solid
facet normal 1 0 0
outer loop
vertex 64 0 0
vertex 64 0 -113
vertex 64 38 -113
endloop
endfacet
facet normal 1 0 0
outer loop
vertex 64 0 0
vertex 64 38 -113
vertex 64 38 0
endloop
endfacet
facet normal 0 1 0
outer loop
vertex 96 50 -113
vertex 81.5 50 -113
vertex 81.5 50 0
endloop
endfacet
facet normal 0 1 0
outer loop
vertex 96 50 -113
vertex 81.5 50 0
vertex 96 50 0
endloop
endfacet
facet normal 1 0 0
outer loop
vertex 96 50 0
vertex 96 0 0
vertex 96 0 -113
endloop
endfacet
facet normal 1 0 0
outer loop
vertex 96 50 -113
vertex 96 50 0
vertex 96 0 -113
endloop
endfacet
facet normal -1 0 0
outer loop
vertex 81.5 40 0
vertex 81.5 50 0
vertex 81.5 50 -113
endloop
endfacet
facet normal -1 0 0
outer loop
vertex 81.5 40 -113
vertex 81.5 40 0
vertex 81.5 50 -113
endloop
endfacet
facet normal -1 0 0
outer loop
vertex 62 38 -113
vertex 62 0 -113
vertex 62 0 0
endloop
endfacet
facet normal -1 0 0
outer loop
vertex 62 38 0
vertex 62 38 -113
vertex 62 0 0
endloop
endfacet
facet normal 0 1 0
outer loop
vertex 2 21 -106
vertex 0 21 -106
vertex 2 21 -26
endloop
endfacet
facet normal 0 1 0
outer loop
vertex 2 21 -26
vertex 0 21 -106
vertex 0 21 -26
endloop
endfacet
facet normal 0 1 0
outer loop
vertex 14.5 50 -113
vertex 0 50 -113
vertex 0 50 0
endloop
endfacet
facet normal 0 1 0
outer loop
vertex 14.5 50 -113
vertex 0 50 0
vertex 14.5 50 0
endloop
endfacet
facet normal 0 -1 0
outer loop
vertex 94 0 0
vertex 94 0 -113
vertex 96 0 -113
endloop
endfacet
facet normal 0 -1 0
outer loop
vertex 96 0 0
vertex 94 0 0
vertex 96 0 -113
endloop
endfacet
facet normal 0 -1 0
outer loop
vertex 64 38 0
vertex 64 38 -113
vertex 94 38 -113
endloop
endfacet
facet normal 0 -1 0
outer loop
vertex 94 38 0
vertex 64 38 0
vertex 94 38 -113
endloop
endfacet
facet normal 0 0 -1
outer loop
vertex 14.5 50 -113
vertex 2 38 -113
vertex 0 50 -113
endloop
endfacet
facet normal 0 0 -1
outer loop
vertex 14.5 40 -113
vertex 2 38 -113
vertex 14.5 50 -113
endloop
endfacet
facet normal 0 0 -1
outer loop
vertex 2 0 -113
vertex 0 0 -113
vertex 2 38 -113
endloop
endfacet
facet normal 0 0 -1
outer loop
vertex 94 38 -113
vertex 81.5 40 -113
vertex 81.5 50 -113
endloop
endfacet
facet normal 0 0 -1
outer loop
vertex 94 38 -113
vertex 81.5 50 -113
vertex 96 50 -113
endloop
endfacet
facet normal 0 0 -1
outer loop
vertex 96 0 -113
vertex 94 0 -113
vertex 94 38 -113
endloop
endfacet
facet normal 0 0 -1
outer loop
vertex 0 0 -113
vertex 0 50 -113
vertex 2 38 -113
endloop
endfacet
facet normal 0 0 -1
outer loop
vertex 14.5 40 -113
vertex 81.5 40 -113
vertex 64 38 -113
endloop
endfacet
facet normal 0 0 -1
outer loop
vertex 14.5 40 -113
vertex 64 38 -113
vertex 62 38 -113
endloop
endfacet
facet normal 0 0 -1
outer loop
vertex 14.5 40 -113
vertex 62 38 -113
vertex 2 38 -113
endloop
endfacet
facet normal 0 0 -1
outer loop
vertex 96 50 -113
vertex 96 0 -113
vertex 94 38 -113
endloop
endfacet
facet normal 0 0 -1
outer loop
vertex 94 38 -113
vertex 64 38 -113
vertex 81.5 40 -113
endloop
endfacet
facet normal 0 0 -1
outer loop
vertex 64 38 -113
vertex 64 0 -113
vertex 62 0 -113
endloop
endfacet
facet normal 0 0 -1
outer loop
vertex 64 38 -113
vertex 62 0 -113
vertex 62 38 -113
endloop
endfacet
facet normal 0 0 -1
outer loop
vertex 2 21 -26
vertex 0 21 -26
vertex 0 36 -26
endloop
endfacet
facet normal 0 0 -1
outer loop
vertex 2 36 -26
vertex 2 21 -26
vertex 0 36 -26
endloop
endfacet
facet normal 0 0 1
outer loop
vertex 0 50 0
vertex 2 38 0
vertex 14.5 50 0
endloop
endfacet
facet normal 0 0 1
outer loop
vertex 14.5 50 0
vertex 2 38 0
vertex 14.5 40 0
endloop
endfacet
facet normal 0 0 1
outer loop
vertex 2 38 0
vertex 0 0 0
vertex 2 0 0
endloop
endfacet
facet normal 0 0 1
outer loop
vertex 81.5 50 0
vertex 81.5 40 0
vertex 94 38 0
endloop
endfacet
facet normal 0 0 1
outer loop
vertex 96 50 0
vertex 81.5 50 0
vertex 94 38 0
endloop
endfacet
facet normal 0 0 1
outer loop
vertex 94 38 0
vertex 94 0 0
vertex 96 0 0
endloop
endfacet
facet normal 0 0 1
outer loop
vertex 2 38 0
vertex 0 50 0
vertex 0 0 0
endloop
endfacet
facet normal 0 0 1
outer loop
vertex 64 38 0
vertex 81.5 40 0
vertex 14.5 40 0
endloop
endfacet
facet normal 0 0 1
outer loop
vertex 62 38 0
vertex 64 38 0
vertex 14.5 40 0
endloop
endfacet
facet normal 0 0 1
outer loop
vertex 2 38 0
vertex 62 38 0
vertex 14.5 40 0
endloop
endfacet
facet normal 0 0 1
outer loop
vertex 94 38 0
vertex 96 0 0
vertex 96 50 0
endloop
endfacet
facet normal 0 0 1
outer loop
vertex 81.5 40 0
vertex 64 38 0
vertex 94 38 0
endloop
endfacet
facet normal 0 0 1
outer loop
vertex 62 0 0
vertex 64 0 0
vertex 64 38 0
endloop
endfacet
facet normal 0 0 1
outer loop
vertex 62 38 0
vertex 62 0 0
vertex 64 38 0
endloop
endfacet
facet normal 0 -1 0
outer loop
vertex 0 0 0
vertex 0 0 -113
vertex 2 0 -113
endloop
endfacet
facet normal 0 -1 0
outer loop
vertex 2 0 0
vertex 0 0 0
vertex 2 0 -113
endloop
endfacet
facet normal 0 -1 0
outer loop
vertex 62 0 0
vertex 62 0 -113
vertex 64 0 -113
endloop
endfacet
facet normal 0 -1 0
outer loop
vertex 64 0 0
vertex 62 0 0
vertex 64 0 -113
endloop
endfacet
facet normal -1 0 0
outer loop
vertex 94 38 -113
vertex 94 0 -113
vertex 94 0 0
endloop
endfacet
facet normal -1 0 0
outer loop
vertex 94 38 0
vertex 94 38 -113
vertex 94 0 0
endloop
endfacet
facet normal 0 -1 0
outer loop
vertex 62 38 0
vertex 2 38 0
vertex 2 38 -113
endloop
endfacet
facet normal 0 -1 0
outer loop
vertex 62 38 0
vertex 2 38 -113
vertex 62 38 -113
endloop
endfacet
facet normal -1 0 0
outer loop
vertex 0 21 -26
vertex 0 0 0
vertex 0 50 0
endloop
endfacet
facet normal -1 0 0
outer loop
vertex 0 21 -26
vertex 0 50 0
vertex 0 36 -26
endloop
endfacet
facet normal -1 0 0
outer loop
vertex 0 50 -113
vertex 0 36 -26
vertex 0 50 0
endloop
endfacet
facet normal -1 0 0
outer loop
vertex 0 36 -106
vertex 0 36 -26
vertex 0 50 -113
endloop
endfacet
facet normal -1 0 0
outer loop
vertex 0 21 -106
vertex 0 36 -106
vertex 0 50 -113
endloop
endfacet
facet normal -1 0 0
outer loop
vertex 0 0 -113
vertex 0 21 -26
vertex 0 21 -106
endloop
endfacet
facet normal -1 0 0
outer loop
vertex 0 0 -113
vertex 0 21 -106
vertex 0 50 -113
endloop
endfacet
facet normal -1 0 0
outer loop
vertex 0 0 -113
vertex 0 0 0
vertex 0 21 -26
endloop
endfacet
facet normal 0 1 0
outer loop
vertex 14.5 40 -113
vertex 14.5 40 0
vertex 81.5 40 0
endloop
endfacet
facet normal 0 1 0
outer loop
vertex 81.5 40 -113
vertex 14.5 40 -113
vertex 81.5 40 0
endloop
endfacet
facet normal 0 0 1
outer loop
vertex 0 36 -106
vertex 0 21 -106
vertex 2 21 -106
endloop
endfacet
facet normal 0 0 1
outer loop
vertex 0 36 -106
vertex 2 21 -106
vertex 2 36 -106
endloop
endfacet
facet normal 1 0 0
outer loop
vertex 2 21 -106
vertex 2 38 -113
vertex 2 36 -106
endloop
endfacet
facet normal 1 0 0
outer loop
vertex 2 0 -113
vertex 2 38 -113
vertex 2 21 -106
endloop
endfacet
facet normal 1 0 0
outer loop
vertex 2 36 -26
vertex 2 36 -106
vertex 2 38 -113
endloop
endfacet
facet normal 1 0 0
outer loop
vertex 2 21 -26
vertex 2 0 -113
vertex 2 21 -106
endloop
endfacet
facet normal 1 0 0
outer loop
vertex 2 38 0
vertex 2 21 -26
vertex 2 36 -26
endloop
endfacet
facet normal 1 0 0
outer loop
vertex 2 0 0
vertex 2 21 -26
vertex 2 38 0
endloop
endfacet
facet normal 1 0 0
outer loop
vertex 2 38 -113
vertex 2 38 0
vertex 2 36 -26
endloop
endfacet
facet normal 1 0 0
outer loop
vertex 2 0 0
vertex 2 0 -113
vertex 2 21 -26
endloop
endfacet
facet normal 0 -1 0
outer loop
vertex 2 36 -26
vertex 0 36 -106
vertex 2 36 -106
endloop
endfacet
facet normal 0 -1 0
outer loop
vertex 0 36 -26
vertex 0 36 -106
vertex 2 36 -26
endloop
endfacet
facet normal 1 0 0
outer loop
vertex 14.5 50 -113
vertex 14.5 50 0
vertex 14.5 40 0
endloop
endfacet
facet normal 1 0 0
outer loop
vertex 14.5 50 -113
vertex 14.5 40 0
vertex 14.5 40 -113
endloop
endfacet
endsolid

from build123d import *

# Parameters (mm, degrees)
SKETCH_1_W          = 96
SKETCH_1_H          = 113
EXTRUDE_1_DEPTH     = 50
SKETCH_2_W          = 67
SKETCH_2_H          = 113
CUT_EXTRUDE_1_DEPTH = 10
SKETCH_3_W          = 60
SKETCH_3_H          = 113
SKETCH_3_W_2        = 30
CUT_EXTRUDE_2_DEPTH = 38
SKETCH_4_W          = 80
SKETCH_4_H          = 15
CUT_EXTRUDE_3_DEPTH = 2


with BuildPart() as part:
    # Эскиз1 → Бобышка-Вытянуть1 (new body)
    with BuildSketch(Plane(origin=(0, 0, 0), x_dir=(1, 0, 0), z_dir=(0, 1, 0))):
        with Locations((48, 56.5)):
            Rectangle(SKETCH_1_W, SKETCH_1_H)
    extrude(amount=EXTRUDE_1_DEPTH)

    # Эскиз2 → Вырез-Вытянуть1 (cut)
    with BuildSketch(Plane(origin=(0, 50, 0), x_dir=(1, 0, 0), z_dir=(0, 1, 0))):
        with Locations((48, 56.5)):
            Rectangle(SKETCH_2_W, SKETCH_2_H)
    extrude(amount=-CUT_EXTRUDE_1_DEPTH, mode=Mode.SUBTRACT)

    # Эскиз3 → Вырез-Вытянуть2 (cut)
    with BuildSketch(Plane.XZ):
        with Locations((32, -56.5)):
            Rectangle(SKETCH_3_W, SKETCH_3_H)
        with Locations((79, -56.5)):
            Rectangle(SKETCH_3_W_2, SKETCH_3_H)
    extrude(amount=-CUT_EXTRUDE_2_DEPTH, mode=Mode.SUBTRACT)

    # Эскиз4 → Вырез-Вытянуть3 (cut)
    with BuildSketch(Plane.ZY):
        with Locations((-66, 28.5)):
            Rectangle(SKETCH_4_W, SKETCH_4_H)
    extrude(amount=-CUT_EXTRUDE_3_DEPTH, mode=Mode.SUBTRACT)


solid = part.part
